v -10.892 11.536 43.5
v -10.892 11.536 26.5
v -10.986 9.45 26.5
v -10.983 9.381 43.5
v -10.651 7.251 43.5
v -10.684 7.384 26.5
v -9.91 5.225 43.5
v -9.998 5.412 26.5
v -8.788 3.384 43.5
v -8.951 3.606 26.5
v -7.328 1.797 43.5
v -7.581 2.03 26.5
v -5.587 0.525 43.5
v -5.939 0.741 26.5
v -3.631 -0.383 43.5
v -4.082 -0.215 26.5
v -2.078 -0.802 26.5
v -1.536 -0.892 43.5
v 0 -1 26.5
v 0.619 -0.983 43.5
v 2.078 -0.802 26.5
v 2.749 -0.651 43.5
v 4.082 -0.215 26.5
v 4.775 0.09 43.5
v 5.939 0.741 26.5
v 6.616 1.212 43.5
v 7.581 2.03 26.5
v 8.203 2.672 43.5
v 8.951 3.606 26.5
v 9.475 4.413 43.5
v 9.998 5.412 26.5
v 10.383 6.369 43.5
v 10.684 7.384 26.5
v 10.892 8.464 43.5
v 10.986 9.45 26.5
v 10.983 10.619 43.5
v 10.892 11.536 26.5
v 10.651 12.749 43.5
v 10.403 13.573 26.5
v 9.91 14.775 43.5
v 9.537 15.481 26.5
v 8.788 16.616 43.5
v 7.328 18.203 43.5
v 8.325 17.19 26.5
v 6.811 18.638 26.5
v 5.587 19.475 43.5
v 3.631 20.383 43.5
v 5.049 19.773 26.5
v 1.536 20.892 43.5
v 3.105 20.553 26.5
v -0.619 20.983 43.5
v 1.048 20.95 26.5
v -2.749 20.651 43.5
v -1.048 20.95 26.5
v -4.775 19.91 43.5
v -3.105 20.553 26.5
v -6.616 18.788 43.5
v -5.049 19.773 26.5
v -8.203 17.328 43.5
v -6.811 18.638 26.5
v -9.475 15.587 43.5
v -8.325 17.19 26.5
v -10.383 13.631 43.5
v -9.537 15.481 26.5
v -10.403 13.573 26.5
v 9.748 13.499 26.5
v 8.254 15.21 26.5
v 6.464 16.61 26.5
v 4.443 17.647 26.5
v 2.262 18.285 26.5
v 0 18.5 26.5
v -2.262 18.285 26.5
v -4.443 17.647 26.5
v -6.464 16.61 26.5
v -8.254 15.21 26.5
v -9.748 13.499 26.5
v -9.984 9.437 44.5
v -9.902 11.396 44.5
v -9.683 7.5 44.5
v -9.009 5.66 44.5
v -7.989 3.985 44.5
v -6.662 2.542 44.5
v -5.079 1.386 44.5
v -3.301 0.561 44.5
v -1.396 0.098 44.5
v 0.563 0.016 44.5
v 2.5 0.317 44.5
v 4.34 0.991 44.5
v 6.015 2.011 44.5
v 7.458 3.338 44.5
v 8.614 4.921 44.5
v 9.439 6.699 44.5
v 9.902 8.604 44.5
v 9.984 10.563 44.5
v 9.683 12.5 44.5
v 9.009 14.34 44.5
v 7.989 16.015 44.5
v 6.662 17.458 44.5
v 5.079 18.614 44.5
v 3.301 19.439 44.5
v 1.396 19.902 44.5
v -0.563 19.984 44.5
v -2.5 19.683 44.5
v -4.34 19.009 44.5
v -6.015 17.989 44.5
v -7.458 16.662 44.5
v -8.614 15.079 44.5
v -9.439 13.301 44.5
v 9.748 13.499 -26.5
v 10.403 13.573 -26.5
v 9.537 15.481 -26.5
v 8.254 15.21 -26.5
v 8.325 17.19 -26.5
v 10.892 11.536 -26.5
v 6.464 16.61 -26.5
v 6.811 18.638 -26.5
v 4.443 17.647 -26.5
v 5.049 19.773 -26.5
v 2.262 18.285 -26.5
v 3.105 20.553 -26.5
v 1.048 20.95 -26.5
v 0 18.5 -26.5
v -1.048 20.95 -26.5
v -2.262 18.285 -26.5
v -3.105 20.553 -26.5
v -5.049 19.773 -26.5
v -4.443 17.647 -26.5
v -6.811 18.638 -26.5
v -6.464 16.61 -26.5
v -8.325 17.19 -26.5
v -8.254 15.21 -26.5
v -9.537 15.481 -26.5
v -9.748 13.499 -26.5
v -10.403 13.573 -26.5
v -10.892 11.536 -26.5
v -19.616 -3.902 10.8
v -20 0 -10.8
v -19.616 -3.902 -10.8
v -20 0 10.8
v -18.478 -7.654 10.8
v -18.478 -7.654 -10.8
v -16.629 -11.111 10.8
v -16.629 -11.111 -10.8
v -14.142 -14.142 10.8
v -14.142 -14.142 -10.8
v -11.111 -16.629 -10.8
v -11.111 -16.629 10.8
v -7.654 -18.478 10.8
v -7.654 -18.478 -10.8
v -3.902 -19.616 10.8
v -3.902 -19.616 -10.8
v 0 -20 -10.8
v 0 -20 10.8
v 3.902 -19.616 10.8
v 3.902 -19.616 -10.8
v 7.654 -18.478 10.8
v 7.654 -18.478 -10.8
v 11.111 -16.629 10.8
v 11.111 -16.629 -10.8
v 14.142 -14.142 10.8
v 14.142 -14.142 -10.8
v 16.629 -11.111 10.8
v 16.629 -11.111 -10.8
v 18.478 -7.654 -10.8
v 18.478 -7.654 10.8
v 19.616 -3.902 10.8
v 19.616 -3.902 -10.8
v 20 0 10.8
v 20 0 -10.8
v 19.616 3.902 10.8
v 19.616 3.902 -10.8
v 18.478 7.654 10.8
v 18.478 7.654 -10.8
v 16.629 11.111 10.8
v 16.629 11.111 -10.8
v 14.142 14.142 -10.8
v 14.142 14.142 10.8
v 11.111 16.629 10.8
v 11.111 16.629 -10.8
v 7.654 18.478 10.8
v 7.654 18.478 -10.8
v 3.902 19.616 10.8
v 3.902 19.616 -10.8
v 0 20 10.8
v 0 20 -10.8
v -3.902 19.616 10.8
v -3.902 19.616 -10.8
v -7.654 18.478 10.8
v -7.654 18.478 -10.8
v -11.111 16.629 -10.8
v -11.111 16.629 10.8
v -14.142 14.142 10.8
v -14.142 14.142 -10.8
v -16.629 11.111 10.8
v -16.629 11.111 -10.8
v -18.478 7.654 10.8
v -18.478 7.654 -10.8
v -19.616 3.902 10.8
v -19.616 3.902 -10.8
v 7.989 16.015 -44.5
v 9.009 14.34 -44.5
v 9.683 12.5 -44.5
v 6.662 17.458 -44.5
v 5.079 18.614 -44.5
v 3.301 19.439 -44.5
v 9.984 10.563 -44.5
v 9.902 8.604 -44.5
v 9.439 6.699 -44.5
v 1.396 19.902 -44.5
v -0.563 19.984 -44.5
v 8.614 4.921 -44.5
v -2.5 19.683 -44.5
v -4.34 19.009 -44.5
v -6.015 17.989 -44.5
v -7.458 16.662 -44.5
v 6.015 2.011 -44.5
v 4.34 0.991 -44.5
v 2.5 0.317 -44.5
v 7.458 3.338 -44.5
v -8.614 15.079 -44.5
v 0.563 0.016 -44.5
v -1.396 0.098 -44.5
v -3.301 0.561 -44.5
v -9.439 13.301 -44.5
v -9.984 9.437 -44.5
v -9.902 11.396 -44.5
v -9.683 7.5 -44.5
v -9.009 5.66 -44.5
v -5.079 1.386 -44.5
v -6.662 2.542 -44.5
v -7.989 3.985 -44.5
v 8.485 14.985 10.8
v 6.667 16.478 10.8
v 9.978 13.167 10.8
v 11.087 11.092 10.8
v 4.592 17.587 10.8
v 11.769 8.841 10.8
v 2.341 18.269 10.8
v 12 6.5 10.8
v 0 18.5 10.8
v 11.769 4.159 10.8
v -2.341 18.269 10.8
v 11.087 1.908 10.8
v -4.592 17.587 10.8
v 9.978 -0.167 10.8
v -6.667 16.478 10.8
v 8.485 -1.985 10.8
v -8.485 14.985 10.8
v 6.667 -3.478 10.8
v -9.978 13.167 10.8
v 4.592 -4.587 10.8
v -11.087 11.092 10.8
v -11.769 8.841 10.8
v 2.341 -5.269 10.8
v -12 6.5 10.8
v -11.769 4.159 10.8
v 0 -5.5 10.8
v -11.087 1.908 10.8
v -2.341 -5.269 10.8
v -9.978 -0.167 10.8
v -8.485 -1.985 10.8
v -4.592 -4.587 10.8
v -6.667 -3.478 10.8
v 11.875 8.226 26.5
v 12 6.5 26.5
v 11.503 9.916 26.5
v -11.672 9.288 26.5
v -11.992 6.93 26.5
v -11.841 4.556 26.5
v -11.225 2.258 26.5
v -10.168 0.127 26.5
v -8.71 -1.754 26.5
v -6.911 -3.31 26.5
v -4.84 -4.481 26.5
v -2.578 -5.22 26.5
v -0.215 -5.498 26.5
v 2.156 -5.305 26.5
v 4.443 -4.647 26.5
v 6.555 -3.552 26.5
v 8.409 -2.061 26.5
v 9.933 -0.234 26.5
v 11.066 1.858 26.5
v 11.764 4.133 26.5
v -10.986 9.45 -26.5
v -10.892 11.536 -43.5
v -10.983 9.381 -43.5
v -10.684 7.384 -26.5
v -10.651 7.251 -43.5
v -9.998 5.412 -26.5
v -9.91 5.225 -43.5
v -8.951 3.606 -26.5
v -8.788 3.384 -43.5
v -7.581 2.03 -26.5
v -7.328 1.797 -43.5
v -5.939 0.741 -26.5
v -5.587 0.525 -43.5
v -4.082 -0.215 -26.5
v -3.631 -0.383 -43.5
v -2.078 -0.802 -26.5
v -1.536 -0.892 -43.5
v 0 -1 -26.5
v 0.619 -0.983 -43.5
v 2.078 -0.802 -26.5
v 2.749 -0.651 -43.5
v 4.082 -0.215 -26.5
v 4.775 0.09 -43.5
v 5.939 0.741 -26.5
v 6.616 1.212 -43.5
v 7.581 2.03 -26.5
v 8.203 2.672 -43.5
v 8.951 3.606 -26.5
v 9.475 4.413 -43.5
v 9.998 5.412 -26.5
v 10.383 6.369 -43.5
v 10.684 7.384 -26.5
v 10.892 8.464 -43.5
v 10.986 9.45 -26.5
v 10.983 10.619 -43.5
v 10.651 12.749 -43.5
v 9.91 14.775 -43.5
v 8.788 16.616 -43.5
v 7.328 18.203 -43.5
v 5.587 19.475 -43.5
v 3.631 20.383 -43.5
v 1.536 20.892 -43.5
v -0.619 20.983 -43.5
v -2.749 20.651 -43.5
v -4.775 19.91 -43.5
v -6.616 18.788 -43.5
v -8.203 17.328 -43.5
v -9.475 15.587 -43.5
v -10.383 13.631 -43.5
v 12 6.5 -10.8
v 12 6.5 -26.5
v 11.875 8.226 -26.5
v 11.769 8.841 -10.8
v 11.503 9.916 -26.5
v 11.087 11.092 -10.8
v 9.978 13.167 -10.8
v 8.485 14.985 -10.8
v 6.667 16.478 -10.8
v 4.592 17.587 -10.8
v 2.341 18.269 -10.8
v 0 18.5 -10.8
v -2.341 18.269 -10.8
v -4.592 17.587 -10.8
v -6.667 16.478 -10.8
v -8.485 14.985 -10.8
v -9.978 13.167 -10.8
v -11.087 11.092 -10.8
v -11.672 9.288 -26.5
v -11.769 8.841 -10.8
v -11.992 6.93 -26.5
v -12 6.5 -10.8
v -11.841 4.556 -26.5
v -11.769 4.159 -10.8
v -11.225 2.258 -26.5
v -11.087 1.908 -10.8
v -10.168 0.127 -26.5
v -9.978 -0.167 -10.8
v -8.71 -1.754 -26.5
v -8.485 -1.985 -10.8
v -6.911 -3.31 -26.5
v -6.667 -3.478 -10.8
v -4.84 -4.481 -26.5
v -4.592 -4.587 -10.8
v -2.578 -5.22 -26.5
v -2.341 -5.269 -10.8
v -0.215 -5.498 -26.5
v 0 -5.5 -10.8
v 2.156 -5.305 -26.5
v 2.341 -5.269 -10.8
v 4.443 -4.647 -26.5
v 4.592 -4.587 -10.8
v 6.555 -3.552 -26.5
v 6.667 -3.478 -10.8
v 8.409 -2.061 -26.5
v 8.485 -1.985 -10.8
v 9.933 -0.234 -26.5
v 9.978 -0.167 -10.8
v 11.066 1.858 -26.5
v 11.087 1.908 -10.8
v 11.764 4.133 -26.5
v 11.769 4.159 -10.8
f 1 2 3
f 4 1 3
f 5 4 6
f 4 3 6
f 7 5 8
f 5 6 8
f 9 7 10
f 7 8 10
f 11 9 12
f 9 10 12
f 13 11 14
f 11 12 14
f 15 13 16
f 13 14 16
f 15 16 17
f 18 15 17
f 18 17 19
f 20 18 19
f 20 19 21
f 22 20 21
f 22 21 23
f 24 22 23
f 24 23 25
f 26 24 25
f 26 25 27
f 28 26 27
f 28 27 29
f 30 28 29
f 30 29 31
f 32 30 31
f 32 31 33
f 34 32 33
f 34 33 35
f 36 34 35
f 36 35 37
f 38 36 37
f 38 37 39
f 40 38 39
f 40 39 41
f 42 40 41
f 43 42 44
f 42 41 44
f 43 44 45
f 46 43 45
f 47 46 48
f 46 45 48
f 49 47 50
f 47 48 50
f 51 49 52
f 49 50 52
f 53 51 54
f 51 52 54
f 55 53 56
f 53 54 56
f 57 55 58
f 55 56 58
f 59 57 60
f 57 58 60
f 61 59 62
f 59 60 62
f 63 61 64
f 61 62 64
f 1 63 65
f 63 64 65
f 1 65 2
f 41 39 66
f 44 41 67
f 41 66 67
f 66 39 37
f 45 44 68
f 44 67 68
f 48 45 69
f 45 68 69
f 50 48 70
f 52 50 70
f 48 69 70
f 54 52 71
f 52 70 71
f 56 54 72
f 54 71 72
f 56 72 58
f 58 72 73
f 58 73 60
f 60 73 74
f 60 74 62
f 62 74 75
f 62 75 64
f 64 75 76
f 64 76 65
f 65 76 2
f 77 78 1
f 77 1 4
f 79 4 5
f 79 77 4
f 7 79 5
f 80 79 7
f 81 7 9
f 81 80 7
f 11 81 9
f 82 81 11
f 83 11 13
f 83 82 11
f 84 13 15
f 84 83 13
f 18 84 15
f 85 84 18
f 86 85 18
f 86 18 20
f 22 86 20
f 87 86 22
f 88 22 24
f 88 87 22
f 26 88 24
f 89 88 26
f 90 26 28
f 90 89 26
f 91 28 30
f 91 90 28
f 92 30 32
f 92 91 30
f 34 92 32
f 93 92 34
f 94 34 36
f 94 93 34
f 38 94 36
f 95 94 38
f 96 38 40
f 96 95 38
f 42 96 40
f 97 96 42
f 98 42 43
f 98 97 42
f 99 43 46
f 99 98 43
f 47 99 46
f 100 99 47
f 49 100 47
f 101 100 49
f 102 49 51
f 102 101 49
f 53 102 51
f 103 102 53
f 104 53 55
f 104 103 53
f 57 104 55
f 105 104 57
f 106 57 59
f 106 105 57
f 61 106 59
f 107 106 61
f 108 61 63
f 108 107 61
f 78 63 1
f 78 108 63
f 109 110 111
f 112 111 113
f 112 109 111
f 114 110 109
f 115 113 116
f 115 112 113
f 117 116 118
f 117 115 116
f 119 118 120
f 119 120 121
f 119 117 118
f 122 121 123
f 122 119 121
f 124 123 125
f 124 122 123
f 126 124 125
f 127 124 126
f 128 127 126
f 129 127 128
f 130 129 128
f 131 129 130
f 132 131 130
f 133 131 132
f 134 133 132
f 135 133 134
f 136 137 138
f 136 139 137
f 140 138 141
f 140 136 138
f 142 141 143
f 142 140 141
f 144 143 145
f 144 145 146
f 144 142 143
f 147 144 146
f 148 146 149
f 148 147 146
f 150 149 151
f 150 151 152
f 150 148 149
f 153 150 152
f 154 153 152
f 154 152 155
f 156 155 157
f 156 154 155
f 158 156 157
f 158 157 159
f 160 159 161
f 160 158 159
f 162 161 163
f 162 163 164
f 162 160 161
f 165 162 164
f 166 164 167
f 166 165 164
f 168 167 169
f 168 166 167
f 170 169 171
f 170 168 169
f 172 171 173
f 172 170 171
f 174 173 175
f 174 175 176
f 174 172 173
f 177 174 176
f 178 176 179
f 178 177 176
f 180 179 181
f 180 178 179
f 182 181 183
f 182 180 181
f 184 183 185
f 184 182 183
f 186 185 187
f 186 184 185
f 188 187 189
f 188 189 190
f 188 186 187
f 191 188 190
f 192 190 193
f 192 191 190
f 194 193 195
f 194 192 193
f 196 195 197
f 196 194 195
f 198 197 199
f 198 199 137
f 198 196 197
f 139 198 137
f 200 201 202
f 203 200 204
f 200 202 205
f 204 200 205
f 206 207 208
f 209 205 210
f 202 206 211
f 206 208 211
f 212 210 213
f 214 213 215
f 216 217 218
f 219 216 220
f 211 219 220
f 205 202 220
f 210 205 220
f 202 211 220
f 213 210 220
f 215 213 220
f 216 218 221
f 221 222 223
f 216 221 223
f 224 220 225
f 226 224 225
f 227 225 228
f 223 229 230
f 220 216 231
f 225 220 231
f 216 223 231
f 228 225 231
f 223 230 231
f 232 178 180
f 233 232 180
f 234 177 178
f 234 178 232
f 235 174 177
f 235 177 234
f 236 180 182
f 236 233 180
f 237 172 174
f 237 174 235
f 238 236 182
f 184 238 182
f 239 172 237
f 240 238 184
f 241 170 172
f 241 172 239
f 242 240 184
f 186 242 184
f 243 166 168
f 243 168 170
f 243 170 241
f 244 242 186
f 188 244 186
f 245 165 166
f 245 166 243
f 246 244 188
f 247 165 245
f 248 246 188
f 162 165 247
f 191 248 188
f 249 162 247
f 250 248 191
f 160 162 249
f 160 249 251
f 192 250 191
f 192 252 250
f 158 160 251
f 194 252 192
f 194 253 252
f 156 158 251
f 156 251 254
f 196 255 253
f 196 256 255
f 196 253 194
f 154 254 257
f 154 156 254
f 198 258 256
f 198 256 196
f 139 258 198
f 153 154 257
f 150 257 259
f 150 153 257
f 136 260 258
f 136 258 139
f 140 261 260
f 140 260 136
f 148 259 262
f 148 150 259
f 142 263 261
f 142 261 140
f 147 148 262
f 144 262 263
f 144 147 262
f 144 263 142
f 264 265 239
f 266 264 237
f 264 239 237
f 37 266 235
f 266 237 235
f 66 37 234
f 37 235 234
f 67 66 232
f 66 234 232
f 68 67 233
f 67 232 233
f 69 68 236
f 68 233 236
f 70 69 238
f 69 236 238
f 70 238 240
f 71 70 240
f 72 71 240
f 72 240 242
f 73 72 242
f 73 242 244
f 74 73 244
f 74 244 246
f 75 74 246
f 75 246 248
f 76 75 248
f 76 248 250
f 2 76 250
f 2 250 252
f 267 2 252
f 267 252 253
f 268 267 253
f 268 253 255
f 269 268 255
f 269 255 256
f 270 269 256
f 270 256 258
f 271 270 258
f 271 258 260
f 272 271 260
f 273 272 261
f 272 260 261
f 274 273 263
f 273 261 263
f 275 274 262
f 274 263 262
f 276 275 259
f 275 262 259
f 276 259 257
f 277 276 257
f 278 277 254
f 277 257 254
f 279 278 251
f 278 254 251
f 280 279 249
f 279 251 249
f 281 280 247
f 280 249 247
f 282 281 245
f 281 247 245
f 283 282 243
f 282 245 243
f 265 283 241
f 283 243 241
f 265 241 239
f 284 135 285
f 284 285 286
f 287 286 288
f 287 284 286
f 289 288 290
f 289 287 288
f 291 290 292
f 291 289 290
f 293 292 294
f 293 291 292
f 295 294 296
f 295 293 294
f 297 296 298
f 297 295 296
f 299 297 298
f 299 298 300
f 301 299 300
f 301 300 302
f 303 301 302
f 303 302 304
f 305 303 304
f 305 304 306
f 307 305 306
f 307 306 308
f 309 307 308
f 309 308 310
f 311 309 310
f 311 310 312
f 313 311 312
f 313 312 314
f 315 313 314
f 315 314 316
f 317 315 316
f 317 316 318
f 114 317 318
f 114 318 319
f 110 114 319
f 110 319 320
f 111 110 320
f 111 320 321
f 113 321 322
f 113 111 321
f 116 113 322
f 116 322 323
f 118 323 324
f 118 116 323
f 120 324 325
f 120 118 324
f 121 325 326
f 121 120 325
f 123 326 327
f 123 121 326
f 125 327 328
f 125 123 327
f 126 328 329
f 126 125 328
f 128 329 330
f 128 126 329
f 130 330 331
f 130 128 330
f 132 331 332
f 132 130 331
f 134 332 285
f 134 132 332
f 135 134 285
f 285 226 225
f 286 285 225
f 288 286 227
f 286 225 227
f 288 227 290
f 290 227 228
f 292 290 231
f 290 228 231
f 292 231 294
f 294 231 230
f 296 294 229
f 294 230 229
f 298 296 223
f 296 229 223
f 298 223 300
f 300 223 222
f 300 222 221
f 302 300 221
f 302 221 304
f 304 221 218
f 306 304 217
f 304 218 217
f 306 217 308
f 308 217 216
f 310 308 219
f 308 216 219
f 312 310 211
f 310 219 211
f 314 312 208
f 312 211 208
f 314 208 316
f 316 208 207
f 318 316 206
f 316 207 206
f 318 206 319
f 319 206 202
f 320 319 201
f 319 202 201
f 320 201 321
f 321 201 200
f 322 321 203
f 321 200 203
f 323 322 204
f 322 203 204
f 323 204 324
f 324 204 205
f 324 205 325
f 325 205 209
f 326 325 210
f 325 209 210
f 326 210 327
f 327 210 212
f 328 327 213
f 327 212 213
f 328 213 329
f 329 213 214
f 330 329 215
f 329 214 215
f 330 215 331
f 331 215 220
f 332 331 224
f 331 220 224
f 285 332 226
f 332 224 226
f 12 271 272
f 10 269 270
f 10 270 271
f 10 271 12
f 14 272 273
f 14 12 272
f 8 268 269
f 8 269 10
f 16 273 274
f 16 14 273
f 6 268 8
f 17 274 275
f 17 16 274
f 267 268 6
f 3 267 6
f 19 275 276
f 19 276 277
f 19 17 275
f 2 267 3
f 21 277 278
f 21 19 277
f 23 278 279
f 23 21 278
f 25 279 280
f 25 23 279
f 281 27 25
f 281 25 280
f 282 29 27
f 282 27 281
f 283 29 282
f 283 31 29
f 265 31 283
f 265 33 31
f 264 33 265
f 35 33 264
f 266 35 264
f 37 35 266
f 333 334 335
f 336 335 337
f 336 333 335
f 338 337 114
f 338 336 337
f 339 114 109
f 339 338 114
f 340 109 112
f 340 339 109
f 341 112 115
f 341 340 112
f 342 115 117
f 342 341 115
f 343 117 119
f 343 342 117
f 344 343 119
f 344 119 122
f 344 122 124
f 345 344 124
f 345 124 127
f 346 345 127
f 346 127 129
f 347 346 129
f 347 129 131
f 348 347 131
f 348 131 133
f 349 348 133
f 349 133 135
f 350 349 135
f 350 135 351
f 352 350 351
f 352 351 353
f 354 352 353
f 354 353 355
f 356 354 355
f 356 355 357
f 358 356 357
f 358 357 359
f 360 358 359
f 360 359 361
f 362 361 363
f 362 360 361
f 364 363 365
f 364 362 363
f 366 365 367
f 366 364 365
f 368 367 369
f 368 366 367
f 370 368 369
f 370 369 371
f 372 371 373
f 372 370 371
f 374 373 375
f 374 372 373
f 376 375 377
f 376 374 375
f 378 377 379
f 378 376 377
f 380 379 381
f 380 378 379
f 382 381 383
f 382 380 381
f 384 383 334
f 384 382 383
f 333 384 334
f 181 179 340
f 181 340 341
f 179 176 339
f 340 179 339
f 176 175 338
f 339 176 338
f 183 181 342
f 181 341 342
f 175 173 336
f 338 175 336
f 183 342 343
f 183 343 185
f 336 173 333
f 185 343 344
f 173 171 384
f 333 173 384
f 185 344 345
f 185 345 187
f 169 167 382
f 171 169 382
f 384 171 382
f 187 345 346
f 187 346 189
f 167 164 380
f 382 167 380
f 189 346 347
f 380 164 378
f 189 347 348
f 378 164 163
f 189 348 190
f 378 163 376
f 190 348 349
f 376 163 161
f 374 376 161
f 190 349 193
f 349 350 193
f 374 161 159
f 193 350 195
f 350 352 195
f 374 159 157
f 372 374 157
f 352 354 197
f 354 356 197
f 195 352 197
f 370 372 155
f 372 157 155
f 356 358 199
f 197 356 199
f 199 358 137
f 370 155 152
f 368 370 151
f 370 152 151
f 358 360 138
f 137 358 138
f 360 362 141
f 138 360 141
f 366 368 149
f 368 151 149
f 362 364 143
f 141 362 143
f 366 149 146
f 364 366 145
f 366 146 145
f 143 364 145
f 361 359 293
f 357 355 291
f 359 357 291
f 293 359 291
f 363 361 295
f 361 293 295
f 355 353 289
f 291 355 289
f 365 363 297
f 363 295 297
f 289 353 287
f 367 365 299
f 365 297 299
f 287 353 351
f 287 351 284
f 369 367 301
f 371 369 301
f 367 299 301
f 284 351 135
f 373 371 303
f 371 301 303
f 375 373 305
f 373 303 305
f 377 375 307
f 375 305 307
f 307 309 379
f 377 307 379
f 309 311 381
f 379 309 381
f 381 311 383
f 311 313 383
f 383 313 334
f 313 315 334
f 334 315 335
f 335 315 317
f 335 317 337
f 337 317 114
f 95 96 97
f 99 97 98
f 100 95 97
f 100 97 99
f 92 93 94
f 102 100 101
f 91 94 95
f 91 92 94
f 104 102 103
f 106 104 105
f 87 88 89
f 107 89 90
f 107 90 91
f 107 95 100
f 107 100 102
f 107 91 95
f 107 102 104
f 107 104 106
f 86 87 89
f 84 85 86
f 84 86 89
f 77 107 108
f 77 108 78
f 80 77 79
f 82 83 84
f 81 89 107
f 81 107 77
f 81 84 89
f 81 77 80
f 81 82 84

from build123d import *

# Parameters (mm, degrees)
ESQUISSE1_R                  = 20
EXTRUSION1_DEPTH             = 10.8
ESQUISSE2_R                  = 12
EXTRUSION2_DEPTH             = 15.7
ESQUISSE3_R                  = 11
EXTRUSION3_DEPTH             = 18
CHANFREIN1_SIZE              = 1
CHANFREIN1_OF_SYM_TRIE2_SIZE = 1


with BuildPart() as part:
    # Esquisse1 → Extrusion1 (new, symmetric)
    with BuildSketch(Plane.XY):
        with Locations(Location((0, 0, 0), (0, 0, 180))):
            Circle(ESQUISSE1_R)
    extrude(amount=EXTRUSION1_DEPTH, both=True)

    # Esquisse2 → Extrusion2 (add)
    with BuildSketch(Plane.XY.offset(10.8)):
        with Locations((0, 6.5)):
            Circle(ESQUISSE2_R)
    extrusion2 = extrude(amount=EXTRUSION2_DEPTH)

    # Esquisse3 → Extrusion3 (add)
    with BuildSketch(Plane.XY.offset(26.5)):
        with Locations(Location((0, 10, 0), (0, 0, 171.974698192))):
            Circle(ESQUISSE3_R)
    extrusion3 = extrude(amount=EXTRUSION3_DEPTH)

    # Chanfrein1
    chanfrein1_edges = [part.edges().sort_by_distance(p)[0] for p in [
        (10.892271647, 8.464285714, 44.5),
    ]]
    chamfer(chanfrein1_edges, length=CHANFREIN1_SIZE)

    # Symétrie2: Extrusion2, Extrusion3 across plane
    add(extrusion2.mirror(Plane.XY))
    add(extrusion3.mirror(Plane.XY))

    # Chanfrein1 of Symétrie2
    chanfrein1_of_sym_trie2_edges = [part.edges().sort_by_distance(p)[0] for p in [
        (10.892271647, 8.464285714, -44.5),
    ]]
    chamfer(chanfrein1_of_sym_trie2_edges, length=CHANFREIN1_OF_SYM_TRIE2_SIZE)


solid = part.part
